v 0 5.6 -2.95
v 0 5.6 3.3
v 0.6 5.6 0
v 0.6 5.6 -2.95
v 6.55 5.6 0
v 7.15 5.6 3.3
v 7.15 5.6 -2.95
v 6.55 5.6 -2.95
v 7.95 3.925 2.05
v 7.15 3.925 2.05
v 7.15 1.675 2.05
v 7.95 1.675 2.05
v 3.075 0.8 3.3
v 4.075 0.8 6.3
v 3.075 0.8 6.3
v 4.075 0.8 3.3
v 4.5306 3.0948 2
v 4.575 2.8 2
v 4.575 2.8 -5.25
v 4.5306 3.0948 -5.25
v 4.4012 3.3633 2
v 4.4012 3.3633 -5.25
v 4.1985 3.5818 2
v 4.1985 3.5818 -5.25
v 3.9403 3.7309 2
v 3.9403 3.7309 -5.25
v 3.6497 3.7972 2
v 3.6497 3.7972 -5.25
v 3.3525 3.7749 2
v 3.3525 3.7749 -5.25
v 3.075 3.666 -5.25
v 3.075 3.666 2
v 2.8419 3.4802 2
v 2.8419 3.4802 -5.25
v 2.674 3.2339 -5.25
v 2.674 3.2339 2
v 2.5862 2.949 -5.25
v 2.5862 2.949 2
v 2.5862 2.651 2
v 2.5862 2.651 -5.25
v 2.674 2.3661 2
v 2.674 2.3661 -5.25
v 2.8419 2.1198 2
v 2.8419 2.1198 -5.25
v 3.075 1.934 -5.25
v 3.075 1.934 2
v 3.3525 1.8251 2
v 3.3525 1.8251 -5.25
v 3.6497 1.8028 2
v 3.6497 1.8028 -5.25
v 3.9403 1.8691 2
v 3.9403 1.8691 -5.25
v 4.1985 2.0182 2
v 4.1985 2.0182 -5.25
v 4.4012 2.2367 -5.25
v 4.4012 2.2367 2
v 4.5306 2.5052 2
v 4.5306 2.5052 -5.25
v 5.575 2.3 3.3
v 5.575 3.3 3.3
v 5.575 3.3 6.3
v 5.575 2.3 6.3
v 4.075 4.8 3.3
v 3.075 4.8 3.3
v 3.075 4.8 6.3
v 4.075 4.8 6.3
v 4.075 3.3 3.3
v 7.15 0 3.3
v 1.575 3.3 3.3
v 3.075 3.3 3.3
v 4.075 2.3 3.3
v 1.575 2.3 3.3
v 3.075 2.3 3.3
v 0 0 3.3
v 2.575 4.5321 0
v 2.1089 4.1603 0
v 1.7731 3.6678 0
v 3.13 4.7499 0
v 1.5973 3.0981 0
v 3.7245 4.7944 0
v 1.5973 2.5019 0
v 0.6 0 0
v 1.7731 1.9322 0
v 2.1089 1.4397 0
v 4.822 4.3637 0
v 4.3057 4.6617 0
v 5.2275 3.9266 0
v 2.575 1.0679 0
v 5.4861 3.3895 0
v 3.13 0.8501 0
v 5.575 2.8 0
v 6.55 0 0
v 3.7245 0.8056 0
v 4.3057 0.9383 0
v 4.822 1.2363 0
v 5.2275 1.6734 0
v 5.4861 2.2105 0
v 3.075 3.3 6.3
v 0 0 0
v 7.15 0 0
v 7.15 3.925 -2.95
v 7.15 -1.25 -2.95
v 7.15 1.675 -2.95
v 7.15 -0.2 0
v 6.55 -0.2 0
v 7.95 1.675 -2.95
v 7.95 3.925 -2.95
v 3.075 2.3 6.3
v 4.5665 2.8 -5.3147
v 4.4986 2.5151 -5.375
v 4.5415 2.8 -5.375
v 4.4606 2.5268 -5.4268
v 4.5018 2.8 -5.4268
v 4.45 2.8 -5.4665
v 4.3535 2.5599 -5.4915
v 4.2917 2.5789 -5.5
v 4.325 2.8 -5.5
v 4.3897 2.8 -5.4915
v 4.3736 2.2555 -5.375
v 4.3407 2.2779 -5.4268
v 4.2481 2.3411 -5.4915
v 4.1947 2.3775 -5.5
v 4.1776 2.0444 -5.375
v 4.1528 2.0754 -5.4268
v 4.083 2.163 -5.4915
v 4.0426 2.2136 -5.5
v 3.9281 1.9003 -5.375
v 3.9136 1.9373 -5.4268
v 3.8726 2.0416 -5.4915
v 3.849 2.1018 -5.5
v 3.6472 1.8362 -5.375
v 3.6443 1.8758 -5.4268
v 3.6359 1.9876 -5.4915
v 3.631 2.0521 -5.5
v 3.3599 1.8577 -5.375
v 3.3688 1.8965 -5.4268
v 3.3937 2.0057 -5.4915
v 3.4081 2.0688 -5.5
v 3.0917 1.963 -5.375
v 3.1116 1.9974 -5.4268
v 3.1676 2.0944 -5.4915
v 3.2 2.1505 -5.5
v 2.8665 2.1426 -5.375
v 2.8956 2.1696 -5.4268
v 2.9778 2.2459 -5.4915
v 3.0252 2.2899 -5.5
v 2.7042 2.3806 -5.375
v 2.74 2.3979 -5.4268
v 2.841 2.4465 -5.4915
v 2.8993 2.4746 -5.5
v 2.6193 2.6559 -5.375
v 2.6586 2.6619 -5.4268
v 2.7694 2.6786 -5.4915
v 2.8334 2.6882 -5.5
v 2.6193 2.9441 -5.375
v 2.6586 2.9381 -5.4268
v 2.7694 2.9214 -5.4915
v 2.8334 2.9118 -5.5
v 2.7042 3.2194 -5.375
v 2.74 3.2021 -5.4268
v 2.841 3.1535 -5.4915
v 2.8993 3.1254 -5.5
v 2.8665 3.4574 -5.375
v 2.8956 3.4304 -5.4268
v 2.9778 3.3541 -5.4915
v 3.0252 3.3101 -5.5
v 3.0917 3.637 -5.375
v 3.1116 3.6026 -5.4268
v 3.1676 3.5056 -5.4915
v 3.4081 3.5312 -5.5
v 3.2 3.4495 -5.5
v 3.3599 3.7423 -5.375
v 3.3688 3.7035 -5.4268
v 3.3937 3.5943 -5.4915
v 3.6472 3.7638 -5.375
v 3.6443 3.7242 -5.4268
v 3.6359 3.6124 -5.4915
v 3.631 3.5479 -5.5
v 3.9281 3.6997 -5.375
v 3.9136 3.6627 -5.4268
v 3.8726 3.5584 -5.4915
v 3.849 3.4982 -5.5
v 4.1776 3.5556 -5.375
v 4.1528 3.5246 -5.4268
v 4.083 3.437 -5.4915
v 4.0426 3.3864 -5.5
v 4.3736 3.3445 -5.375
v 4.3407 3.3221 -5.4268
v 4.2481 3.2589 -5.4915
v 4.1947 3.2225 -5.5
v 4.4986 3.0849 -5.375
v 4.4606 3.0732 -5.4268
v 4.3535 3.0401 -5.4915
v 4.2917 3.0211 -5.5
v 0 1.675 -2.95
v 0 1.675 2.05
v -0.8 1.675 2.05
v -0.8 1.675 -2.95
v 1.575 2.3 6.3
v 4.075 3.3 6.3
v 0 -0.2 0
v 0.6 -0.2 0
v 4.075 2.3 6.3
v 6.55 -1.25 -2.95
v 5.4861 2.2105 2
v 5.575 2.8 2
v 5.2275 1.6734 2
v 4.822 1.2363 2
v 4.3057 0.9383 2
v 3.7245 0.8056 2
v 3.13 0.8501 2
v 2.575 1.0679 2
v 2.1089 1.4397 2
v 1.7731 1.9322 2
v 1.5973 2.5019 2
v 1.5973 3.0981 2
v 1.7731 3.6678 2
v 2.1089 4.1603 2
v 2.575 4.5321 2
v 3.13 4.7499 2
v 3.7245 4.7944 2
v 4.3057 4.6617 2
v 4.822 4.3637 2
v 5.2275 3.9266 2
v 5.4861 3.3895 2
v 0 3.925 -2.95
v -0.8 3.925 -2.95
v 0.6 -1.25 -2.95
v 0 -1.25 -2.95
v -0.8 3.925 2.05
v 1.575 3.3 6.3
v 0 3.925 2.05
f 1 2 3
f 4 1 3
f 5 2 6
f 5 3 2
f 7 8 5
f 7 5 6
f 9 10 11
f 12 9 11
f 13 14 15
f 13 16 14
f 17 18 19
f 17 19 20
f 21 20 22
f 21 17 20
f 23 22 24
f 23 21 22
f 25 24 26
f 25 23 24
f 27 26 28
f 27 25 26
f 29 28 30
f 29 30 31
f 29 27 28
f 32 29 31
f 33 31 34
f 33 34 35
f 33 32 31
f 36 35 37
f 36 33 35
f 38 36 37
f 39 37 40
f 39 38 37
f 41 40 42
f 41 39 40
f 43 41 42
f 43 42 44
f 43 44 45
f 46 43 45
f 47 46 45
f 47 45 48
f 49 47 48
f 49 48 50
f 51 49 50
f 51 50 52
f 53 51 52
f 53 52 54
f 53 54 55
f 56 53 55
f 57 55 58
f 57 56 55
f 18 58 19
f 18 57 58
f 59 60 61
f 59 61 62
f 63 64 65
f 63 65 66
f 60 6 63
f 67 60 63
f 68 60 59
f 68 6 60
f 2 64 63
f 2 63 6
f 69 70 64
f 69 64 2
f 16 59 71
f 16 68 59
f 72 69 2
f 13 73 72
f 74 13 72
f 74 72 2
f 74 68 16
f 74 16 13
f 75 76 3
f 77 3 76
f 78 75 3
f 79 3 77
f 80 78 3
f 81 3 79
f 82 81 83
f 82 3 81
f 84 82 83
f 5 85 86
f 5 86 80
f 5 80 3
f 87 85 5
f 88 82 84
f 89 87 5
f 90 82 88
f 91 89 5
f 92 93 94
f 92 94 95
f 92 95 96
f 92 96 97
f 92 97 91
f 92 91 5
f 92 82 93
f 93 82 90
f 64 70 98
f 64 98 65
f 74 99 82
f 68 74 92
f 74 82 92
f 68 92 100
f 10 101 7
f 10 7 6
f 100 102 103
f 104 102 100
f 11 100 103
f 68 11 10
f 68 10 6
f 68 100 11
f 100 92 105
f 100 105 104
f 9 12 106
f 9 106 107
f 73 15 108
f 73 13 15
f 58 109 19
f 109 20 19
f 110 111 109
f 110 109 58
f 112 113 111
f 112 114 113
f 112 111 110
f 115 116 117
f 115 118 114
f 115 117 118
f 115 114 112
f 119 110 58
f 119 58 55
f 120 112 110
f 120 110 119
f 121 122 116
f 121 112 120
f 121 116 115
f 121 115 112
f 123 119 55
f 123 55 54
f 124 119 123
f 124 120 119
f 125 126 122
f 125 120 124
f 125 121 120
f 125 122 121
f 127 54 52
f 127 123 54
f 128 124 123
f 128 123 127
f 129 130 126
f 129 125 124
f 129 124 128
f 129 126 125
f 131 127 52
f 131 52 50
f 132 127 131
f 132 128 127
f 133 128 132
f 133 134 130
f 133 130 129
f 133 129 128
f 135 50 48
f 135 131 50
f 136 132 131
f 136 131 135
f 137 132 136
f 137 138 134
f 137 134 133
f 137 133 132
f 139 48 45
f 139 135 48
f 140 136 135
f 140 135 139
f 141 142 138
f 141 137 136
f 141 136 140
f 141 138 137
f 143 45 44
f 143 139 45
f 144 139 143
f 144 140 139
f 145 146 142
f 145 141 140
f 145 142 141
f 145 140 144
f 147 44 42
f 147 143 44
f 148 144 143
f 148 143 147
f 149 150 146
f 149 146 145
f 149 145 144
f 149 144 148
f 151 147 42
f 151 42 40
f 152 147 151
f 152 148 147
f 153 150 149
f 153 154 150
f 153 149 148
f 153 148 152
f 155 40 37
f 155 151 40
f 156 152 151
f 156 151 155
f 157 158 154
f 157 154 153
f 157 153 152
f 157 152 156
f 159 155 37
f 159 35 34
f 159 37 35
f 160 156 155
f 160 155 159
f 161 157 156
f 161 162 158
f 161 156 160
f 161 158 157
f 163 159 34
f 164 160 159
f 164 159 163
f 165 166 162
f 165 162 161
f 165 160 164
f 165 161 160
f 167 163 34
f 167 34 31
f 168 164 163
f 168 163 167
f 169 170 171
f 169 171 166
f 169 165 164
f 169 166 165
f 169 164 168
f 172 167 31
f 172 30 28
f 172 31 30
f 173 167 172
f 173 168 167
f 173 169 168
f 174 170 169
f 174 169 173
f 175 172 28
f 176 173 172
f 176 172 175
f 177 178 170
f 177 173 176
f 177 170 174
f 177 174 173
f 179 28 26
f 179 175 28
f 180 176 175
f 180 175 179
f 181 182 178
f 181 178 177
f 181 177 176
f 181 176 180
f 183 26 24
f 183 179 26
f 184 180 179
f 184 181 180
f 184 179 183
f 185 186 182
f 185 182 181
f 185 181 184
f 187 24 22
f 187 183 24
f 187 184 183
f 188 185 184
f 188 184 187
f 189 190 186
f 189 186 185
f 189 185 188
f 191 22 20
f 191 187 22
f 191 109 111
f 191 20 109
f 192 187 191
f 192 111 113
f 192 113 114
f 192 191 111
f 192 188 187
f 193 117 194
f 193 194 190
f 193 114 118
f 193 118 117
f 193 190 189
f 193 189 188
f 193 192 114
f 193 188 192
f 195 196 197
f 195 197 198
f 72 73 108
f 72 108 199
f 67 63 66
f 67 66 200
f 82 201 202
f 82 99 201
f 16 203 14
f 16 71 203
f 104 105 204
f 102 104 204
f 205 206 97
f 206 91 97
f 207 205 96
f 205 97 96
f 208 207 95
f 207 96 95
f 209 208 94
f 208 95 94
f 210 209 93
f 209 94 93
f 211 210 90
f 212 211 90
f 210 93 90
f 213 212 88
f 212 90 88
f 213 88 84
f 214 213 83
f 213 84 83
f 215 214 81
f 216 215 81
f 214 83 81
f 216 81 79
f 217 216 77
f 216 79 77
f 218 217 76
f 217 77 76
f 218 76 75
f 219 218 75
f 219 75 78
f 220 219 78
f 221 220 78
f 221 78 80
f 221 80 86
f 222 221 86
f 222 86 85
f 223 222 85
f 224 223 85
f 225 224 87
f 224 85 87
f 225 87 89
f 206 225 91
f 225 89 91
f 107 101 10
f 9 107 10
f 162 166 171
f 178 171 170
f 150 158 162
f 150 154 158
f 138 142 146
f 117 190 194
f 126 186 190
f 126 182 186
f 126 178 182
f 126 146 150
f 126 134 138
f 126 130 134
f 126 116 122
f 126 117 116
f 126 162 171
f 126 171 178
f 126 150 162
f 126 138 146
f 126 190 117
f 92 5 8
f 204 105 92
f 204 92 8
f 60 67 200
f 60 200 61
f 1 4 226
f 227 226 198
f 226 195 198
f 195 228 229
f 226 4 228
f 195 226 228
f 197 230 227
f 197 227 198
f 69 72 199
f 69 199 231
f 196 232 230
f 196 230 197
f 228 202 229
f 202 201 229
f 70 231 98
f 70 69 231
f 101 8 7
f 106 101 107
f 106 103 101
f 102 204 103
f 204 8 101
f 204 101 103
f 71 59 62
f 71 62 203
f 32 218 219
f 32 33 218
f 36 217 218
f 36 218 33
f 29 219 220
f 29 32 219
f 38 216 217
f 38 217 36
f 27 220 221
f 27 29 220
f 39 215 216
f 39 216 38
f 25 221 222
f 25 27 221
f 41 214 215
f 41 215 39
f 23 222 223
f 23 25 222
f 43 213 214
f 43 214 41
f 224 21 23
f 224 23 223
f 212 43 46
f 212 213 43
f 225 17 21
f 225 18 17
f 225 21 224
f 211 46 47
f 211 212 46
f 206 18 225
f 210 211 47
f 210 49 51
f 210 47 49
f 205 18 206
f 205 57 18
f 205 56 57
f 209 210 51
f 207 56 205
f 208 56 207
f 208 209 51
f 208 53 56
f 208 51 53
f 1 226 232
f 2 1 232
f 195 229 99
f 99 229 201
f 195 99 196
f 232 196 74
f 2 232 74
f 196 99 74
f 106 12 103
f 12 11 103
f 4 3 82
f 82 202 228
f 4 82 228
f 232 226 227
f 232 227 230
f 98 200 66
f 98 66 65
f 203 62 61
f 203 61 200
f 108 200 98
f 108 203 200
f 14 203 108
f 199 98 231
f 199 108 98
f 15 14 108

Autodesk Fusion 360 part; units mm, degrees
sketch "Sketch1" plane through (0, 0, 0) normal (0, 1, 0) x (1, 0, 0)
  line L0 (0, 0) -> (7.15, 0)
  line L1 (7.15, 0) -> (7.15, -3.3)
  line L2 (7.15, -3.3) -> (0, -3.3)
  line L3 (0, -3.3) -> (0, 0)
  line L4 (0, 0) -> (0.6, 0)
  line L5 (0.6, 0) -> (0.6, 2.95)
  line L6 (0.6, 2.95) -> (0, 2.95)
  line L7 (0, 2.95) -> (0, 0)
  line L8 (7.15, 0) -> (6.55, 0)
  line L9 (6.55, 0) -> (6.55, 2.95)
  line L10 (6.55, 2.95) -> (7.15, 2.95)
  line L11 (7.15, 2.95) -> (7.15, 0)
  dimension "d1" = 7.15
  dimension "d2" = 3.3
  dimension "d3" = 0.6
  dimension "d4" = 2.95
  dimension "d5" = 0.6
  dimension "d6" = 2.95
extrude "Extrude1" add sketch "Sketch1" along normal blind 5.6
sketch "Sketch2" plane through (7.15, 0, 0) normal (1, 0, 0) x (0, 1, 0)
  line L0 (0, 3.3) -> (0, -2.95)
  line L1 (0, -2.95) -> (5.6, -2.95)
  line L2 (5.6, -2.95) -> (5.6, 3.3)
  line L3 (5.6, 3.3) -> (0, 3.3)
  line L4 (1.675, -2.95) -> (3.925, -2.95)
  line L5 (3.925, -2.95) -> (3.925, 2.05)
  line L6 (3.925, 2.05) -> (1.675, 2.05)
  line L7 (1.675, 2.05) -> (1.675, -2.95)
  point P0 (2.8, 0)
  dimension "d12" = 2.25
  dimension "d13" = 5
extrude "Extrude2" add sketch "Sketch2" along normal blind 0.8 contours L1 L4 L5 L6 L7
sketch "Sketch3" plane through (0, 0, 0) normal (-1, 0, 0) x (0, -1, 0)
  line L0 (0, -2.95) -> (0, 3.3)
  line L1 (0, 3.3) -> (-5.6, 3.3)
  line L2 (-5.6, 3.3) -> (-5.6, -2.95)
  line L3 (-5.6, -2.95) -> (0, -2.95)
  line L4 (-1.675, -2.5004) -> (-1.675, -2.95)
  line L5 (-1.675, -2.95) -> (-3.925, -2.95)
  line L6 (-3.925, -2.95) -> (-3.925, -2.5004)
  line L7 (-1.675, -2.95) -> (-3.925, -2.95)
  line L8 (-3.925, -2.95) -> (-3.925, 2.05)
  line L9 (-3.925, 2.05) -> (-1.675, 2.05)
  line L10 (-1.675, 2.05) -> (-1.675, -2.95)
  point P0 (-2.8, -0.0004)
  dimension "d19" = 2.25
  dimension "d20" = 5
extrude "Extrude3" add sketch "Sketch3" along normal blind 0.8 contours L3 L4 L5 L6 L7 L8 L9 L10
sketch "Sketch4" plane through (0, 0, 0) normal (0, -1, 0) x (1, 0, 0)
  line L0 (0.6, -2.95) -> (0.6, 0)
  line L1 (0.6, 0) -> (6.55, 0)
  line L2 (6.55, 0) -> (6.55, -2.95)
  line L3 (6.55, -2.95) -> (7.15, -2.95)
  line L4 (7.15, -2.95) -> (7.15, 3.3)
  line L5 (7.15, 3.3) -> (0, 3.3)
  line L6 (0, 3.3) -> (0, -2.95)
  line L7 (0, -2.95) -> (0.6, -2.95)
  line L8 (0, 0) -> (0.6, 0)
  line L9 (0.6, 0) -> (0.6, -2.95)
  line L10 (0.6, -2.95) -> (0, -2.95)
  line L11 (0, -2.95) -> (0, 0)
  line L12 (6.55, 0) -> (7.15, 0)
  line L13 (7.15, 0) -> (7.15, -2.95)
  line L14 (7.15, -2.95) -> (6.55, -2.95)
  line L15 (6.55, -2.95) -> (6.55, 0)
extrude "Extrude4" add sketch "Sketch4" along normal blind 2 contours L0 L6 L7 L8 L9 L10 L11 | L2 L3 L4 L12 L13 L14 L15
sketch "Sketch5" plane through (0, 0, 0) normal (-1, 0, 0) x (0, -1, 0)
  line L0 (-3.925, -2.95) -> (-3.925, 2.05)
  line L1 (-3.925, 2.05) -> (-1.675, 2.05)
  line L2 (-1.675, 2.05) -> (-1.675, -2.95)
  line L3 (0, 0) -> (0, 3.3)
  line L4 (0, 3.3) -> (-5.6, 3.3)
  line L5 (-5.6, 3.3) -> (-5.6, -2.95)
  line L6 (-5.6, -2.95) -> (-3.925, -2.95)
sketch "Sketch6" plane through (0, 0, -2.95) normal (0, 0, -1) x (1, 0, 0)
  line L0 (0, 2) -> (0, -1.675)
  line L1 (0, -1.675) -> (-0.8, -1.675)
  line L2 (-0.8, -1.675) -> (-0.8, -3.925)
  line L3 (-0.8, -3.925) -> (0, -3.925)
  line L4 (0, -3.925) -> (0, -5.6)
  line L5 (0, -5.6) -> (0.6, -5.6)
  line L6 (0.6, -5.6) -> (0.6, 2)
  line L7 (0.6, 2) -> (0, 2)
  line L8 (0.6, 2) -> (0, 2)
  line L9 (0, 2) -> (0, 1.4)
  line L10 (0, 1.4) -> (0.6, 1.4)
  line L11 (0.6, 1.4) -> (0.6, 2)
sketch "Sketch7" plane through (0, 0, -2.95) normal (0, 0, -1) x (1, 0, 0)
  line L0 (6.55, 2) -> (6.55, -5.6)
  line L1 (6.55, -5.6) -> (7.15, -5.6)
  line L2 (7.15, -5.6) -> (7.15, -3.925)
  line L3 (7.15, -3.925) -> (7.95, -3.925)
  line L4 (7.95, -3.925) -> (7.95, -1.675)
  line L5 (7.95, -1.675) -> (7.15, -1.675)
  line L6 (7.15, -1.675) -> (7.15, 2)
  line L7 (7.15, 2) -> (6.55, 2)
  line L8 (7.15, 2) -> (6.55, 2)
  line L9 (6.55, 2) -> (6.55, 1.4)
  line L10 (6.55, 1.4) -> (7.15, 1.4)
  line L11 (7.15, 1.4) -> (7.15, 2)
  dimension "d25" = 0.6
extrude "Extrude5" add sketch "Sketch7" sketch "Sketch6" along normal blind 0.5 contours L0 L6 L7 L8 L9 L10 L11 of sketch 2 contours L0 L6 L7 L8 L9 L10 L11
sketch "Sketch8" plane through (0, 0, 0) normal (-1, 0, 0) x (0, -1, 0)
  line L0 (0.2, 0) -> (1.25, -2.95)
  line L1 (1.25, -2.95) -> (1.3, -3.6)
  line L2 (1.3, -3.6) -> (2.5, -3.6)
  line L3 (2.5, -3.6) -> (2.5, 0.457)
  line L4 (2.5, 0.457) -> (0.2, 0)
sketch "Sketch9" plane through (0, -1.35, -1.5715) normal (-1, 0, 0) x (0, -1, 0)
extrude "Extrude6" cut sketch "Sketch8" against normal blind 11
sketch "Sketch10" plane through (0, 0, 0) normal (0, 0, -1) x (1, 0, 0)
  line L0 (6.55, 0) -> (0.6, 0)
  line L1 (0.6, 0) -> (0.6, -5.6)
  line L2 (0.6, -5.6) -> (6.55, -5.6)
  line L3 (6.55, -5.6) -> (6.55, 0)
  line L4 (3.575, -5.6) -> (3.575, 0)
  circle A0 centre (3.575, -2.8) radius 1
  circle A1 centre (3.575, -2.8) radius 2
  dimension "d30" = 2
  dimension "d31" = 4
extrude "Extrude7" cut sketch "Sketch10" against normal blind 2 contours L4 A0 A1 | L4 A0 A1
extrude "Extrude8" add 1 faces at (3.8935, 2.8983, 0) along direction (0, 0, -1) blind 5.5
sketch "Sketch11" plane through (0, 0, 0) normal (0, 1, 0) x (1, 0, 0)
fillet "Fillet1" radius 0.25 1 edges at (2.6427, 3.1616, -5.5)
sketch "Sketch12" plane through (0, 0, 3.3) normal (0, 0, 1) x (-1, 0, 0)
  line L0 (0, 0) -> (-7.15, 0)
  line L1 (-7.15, 0) -> (-7.15, -5.6)
  line L2 (-7.15, -5.6) -> (0, -5.6)
  line L3 (0, -5.6) -> (0, 0)
  line L4 (-3.575, -5.6) -> (-3.575, 0)
  line L5 (0, -2.8) -> (-7.15, -2.8)
  line L6 (-1.575, -4.8) -> (-5.575, -4.8)
  line L7 (-5.575, -4.8) -> (-5.575, -0.8)
  line L8 (-5.575, -0.8) -> (-1.575, -0.8)
  line L9 (-1.575, -0.8) -> (-1.575, -4.8)
  line L10 (-1.575, -4.8) -> (-5.575, -0.8) construction
  line L11 (-5.575, -4.8) -> (-1.575, -0.8) construction
  line L12 (-3.075, -4.8) -> (-4.075, -4.8)
  line L13 (-4.075, -4.8) -> (-4.075, -0.8)
  line L14 (-4.075, -0.8) -> (-3.075, -0.8)
  line L15 (-3.075, -0.8) -> (-3.075, -4.8)
  line L16 (-3.075, -4.8) -> (-4.075, -0.8) construction
  line L17 (-4.075, -4.8) -> (-3.075, -0.8) construction
  line L18 (-1.575, -3.3) -> (-5.575, -3.3)
  line L19 (-5.575, -3.3) -> (-5.575, -2.3)
  line L20 (-5.575, -2.3) -> (-1.575, -2.3)
  line L21 (-1.575, -2.3) -> (-1.575, -3.3)
  line L22 (-1.575, -3.3) -> (-5.575, -2.3) construction
  line L23 (-5.575, -3.3) -> (-1.575, -2.3) construction
  point P0 (-3.575, -2.8)
  point P1 (-3.575, -2.8)
  point P2 (-3.575, -2.8)
  dimension "d38" = 4
  dimension "d39" = 4
  dimension "d40" = 1
  dimension "d41" = 4
  dimension "d42" = 4
  dimension "d43" = 1
extrude "Extrude9" add sketch "Sketch12" along normal blind 3 contours L4 L8 L14 L15 L20 | L4 L8 L13 L14 L20 | L5 L9 L15 L18 L21 | L5 L9 L15 L20 L21 | L4 L5 L15 L20 | L4 L5 L13 L20 | L4 L5 L15 L18 | L5 L7 L13 L19 L20 | L5 L7 L13 L18 L19 | L4 L5 L13 L18 | L4 L6 L12 L13 L18 | L4 L6 L12 L15 L18
sketch "Sketch13" plane through (0, 0, 0) normal (1, 0, 0) x (0, 1, 0)
sketch "Sketch14" plane through (0, 0, -5.5) normal (0, 0, -1) x (1, 0, 0)
  circle A0 centre (3.575, -2.8) radius 0.75
sketch "Sketch15" plane through (7.95, 0, 0) normal (1, 0, 0) x (0, 1, 0)
  line L0 (1.675, 2.05) -> (1.675, -2.95)
  line L1 (1.675, -2.95) -> (3.925, -2.95)
  line L2 (3.925, -2.95) -> (3.925, 2.05)
  line L3 (3.925, 2.05) -> (1.675, 2.05)
  line L4 (0.8, 6.3) -> (4.8, 6.3)
  line L5 (0.8, 6.3) -> (0.8, 3.3)
  line L6 (0, 3.3) -> (5.6, 3.3)
  line L7 (5.6, 3.3) -> (5.6, -2.95)
  line L8 (5.6, -2.95) -> (5.6, 3.3)
  line L9 (-1.25, -2.95) -> (5.6, -2.95)
  line L10 (0, 0) -> (0, -2.95)
  dimension "d46" = 4
  dimension "d47" = 3
  dimension "d48" = 5.6
  dimension "d49" = 6.25
  dimension "d50" = 6.85
  dimension "d51" = 2.95
